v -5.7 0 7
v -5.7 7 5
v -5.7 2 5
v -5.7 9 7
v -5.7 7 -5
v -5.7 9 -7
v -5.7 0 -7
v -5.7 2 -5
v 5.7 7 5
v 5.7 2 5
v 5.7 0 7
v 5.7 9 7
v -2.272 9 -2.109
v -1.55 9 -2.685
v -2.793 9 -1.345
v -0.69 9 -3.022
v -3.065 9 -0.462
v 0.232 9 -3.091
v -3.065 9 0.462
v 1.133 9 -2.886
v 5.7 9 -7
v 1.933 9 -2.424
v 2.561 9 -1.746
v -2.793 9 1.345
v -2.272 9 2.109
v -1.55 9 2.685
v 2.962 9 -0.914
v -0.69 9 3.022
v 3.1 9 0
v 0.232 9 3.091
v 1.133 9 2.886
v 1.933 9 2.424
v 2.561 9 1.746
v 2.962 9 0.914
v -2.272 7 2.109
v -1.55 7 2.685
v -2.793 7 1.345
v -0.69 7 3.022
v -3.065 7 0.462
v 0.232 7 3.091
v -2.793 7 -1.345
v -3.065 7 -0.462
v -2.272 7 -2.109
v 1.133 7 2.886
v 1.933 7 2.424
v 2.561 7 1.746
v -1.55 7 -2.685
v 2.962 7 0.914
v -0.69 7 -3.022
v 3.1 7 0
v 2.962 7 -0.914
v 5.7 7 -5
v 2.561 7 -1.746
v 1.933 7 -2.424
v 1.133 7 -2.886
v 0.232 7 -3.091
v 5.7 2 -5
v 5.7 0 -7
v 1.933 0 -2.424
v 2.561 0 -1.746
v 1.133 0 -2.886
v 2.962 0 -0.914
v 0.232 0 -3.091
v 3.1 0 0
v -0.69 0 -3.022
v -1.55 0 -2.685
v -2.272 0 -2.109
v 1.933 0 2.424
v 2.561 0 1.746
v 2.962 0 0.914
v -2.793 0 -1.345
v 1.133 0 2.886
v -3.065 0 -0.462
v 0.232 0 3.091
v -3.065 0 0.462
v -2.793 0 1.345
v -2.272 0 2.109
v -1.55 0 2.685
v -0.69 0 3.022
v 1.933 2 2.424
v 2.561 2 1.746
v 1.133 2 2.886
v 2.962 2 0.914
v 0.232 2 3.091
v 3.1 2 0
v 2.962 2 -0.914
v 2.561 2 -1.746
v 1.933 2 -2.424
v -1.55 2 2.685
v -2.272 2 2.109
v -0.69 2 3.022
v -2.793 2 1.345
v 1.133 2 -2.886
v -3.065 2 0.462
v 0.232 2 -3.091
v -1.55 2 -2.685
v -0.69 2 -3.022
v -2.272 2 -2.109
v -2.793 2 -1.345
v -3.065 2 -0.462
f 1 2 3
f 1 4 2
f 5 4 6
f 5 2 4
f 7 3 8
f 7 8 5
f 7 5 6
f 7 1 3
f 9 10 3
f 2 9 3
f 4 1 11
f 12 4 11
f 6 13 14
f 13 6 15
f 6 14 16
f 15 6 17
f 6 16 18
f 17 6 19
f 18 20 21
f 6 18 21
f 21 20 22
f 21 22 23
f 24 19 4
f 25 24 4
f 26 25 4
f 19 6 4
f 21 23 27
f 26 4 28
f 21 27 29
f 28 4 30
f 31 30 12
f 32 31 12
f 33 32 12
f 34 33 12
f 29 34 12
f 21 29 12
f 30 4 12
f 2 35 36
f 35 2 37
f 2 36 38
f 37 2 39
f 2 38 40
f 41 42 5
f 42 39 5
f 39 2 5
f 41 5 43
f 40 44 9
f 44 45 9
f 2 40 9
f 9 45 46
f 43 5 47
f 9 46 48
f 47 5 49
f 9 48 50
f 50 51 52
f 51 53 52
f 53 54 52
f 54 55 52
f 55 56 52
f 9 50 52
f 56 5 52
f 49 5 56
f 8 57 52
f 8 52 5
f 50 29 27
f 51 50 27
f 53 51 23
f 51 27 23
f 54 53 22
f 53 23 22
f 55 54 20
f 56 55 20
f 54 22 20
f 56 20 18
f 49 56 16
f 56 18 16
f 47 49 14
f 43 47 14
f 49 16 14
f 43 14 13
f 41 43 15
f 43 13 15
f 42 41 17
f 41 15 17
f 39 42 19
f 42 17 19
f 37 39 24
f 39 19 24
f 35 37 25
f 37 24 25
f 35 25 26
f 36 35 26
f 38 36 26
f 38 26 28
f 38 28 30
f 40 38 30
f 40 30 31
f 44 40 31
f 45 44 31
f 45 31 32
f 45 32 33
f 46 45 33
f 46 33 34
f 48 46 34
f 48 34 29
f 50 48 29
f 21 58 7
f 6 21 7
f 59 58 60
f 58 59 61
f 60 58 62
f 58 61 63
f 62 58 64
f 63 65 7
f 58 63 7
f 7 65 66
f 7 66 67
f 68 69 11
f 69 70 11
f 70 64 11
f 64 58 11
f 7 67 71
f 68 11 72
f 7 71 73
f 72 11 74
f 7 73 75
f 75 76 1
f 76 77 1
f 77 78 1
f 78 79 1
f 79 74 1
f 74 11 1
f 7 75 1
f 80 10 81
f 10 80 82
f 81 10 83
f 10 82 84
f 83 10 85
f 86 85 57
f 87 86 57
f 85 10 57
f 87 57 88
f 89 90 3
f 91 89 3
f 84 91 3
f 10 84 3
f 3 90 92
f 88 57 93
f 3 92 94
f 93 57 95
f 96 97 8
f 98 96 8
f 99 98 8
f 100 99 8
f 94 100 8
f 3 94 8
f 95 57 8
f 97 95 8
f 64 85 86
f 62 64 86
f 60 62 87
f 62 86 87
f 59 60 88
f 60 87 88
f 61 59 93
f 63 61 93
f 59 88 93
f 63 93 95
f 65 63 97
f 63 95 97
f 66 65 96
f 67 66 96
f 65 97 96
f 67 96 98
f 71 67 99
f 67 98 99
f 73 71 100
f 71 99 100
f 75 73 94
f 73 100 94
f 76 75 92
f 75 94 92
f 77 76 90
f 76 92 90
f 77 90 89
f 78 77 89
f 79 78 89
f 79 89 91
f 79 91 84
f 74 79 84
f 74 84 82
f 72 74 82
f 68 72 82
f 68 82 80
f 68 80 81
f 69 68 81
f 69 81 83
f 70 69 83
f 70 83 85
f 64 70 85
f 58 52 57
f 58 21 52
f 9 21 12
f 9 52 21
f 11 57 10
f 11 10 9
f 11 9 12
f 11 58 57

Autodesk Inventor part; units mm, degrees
ref_plane "YZ Plane" through (0, 0, 0) normal (1, 0, 0) x (0, 1, 0)
ref_plane "XZ Plane" through (0, 0, 0) normal (0, 1, 0) x (-1, 0, 0)
ref_plane "XY Plane" through (0, 0, 0) normal (0, 0, 1) x (1, 0, 0)
sketch "Sketch2" plane through (0, 0, 0) normal (0, 1, 0) x (-1, 0, 0)
  line L0 (-5.7, 5) -> (5.7, 5)
  line L1 (5.7, 5) -> (5.7, -5)
  line L2 (5.7, -5) -> (-5.7, -5)
  line L3 (-5.7, -5) -> (-5.7, 5)
  line L4 (-5.7, 5) -> (5.7, -5) construction
  line L5 (5.7, 5) -> (-5.7, -5) construction
  circle A0 centre (0, 0) radius 2.6
  dimension "d0" = 11.4
  dimension "d1" = 10
  dimension "d2" = 5.2
extrude "Extrusion1" add sketch "Sketch2" along normal blind 9
sketch "Sketch3" plane through (5.7, 0, -5) normal (0, 0, -1) x (-1, 0, 0)
  line L0 (0, 9) -> (11.4, 9) projected
  line L1 (0, 9) -> (0, 7)
  line L2 (0, 0) -> (0, 9) projected
  line L3 (0, 0) -> (0, 2)
  line L4 (0, 7) -> (0, 2)
  line L5 (0, 2) -> (11.4, 2)
  line L6 (11.4, 2) -> (11.4, 7)
  line L7 (11.4, 7) -> (0, 7)
  point P0 (5.7, 0)
  dimension "d5" = 2
  dimension "d6" = 2
extrude "Extrusion2" cut sketch "Sketch3" against normal blind 10.5875
sketch "Sketch4" plane through (0, 0, 0) normal (0, -1, 0) x (1, 0, 0)
  line L0 (-5.7, -5) -> (-5.7, 5) projected
  line L1 (-5.7, 5) -> (-5.7, 7)
  line L2 (-5.7, 7) -> (5.7, 7)
  line L3 (5.7, 7) -> (5.7, -7)
  line L4 (5.7, -7) -> (-5.7, -7)
  line L5 (-5.7, -7) -> (-5.7, 7)
  line L6 (-5.7, 7) -> (-5.7, -7)
  line L7 (-5.7, -7) -> (-7.7, -7)
  line L8 (-7.7, -7) -> (-7.7, 7)
  line L9 (-7.7, 7) -> (-5.7, 7)
  line L10 (5.7, -7) -> (5.7, -5)
  line L11 (5.7, -5) -> (-5.7, -5)
  line L12 (-5.7, -5) -> (-5.7, -7)
  line L13 (-5.7, -7) -> (5.7, -7)
  line L14 (-5.7, 5) -> (-5.7, 7)
  line L15 (-5.7, 7) -> (5.7, 7)
  line L16 (5.7, 7) -> (5.7, 5)
  line L17 (5.7, 5) -> (-5.7, 5)
  line L18 (-5.7, -5) -> (-5.7, 5)
  line L19 (5.7, -5) -> (5.7, 5)
  point P0 (0, 0)
  dimension "d9" = 2
  dimension "d10" = 11.4
  dimension "d11" = 14
  dimension "d12" = 2
extrude "Extrusion3" add sketch "Sketch4" against normal up to surface (9 mm away) contours L11 L3 L4 L5 | L1 L2 L3 L17
sketch "Sketch6" plane through (0, 9, 0) normal (0, 1, 0) x (1, 0, 0)
  circle A0 centre (0, 0) radius 3.1
  dimension "d18" = 6.2
extrude "Extrusion4" cut sketch "Sketch6" against normal blind 10
